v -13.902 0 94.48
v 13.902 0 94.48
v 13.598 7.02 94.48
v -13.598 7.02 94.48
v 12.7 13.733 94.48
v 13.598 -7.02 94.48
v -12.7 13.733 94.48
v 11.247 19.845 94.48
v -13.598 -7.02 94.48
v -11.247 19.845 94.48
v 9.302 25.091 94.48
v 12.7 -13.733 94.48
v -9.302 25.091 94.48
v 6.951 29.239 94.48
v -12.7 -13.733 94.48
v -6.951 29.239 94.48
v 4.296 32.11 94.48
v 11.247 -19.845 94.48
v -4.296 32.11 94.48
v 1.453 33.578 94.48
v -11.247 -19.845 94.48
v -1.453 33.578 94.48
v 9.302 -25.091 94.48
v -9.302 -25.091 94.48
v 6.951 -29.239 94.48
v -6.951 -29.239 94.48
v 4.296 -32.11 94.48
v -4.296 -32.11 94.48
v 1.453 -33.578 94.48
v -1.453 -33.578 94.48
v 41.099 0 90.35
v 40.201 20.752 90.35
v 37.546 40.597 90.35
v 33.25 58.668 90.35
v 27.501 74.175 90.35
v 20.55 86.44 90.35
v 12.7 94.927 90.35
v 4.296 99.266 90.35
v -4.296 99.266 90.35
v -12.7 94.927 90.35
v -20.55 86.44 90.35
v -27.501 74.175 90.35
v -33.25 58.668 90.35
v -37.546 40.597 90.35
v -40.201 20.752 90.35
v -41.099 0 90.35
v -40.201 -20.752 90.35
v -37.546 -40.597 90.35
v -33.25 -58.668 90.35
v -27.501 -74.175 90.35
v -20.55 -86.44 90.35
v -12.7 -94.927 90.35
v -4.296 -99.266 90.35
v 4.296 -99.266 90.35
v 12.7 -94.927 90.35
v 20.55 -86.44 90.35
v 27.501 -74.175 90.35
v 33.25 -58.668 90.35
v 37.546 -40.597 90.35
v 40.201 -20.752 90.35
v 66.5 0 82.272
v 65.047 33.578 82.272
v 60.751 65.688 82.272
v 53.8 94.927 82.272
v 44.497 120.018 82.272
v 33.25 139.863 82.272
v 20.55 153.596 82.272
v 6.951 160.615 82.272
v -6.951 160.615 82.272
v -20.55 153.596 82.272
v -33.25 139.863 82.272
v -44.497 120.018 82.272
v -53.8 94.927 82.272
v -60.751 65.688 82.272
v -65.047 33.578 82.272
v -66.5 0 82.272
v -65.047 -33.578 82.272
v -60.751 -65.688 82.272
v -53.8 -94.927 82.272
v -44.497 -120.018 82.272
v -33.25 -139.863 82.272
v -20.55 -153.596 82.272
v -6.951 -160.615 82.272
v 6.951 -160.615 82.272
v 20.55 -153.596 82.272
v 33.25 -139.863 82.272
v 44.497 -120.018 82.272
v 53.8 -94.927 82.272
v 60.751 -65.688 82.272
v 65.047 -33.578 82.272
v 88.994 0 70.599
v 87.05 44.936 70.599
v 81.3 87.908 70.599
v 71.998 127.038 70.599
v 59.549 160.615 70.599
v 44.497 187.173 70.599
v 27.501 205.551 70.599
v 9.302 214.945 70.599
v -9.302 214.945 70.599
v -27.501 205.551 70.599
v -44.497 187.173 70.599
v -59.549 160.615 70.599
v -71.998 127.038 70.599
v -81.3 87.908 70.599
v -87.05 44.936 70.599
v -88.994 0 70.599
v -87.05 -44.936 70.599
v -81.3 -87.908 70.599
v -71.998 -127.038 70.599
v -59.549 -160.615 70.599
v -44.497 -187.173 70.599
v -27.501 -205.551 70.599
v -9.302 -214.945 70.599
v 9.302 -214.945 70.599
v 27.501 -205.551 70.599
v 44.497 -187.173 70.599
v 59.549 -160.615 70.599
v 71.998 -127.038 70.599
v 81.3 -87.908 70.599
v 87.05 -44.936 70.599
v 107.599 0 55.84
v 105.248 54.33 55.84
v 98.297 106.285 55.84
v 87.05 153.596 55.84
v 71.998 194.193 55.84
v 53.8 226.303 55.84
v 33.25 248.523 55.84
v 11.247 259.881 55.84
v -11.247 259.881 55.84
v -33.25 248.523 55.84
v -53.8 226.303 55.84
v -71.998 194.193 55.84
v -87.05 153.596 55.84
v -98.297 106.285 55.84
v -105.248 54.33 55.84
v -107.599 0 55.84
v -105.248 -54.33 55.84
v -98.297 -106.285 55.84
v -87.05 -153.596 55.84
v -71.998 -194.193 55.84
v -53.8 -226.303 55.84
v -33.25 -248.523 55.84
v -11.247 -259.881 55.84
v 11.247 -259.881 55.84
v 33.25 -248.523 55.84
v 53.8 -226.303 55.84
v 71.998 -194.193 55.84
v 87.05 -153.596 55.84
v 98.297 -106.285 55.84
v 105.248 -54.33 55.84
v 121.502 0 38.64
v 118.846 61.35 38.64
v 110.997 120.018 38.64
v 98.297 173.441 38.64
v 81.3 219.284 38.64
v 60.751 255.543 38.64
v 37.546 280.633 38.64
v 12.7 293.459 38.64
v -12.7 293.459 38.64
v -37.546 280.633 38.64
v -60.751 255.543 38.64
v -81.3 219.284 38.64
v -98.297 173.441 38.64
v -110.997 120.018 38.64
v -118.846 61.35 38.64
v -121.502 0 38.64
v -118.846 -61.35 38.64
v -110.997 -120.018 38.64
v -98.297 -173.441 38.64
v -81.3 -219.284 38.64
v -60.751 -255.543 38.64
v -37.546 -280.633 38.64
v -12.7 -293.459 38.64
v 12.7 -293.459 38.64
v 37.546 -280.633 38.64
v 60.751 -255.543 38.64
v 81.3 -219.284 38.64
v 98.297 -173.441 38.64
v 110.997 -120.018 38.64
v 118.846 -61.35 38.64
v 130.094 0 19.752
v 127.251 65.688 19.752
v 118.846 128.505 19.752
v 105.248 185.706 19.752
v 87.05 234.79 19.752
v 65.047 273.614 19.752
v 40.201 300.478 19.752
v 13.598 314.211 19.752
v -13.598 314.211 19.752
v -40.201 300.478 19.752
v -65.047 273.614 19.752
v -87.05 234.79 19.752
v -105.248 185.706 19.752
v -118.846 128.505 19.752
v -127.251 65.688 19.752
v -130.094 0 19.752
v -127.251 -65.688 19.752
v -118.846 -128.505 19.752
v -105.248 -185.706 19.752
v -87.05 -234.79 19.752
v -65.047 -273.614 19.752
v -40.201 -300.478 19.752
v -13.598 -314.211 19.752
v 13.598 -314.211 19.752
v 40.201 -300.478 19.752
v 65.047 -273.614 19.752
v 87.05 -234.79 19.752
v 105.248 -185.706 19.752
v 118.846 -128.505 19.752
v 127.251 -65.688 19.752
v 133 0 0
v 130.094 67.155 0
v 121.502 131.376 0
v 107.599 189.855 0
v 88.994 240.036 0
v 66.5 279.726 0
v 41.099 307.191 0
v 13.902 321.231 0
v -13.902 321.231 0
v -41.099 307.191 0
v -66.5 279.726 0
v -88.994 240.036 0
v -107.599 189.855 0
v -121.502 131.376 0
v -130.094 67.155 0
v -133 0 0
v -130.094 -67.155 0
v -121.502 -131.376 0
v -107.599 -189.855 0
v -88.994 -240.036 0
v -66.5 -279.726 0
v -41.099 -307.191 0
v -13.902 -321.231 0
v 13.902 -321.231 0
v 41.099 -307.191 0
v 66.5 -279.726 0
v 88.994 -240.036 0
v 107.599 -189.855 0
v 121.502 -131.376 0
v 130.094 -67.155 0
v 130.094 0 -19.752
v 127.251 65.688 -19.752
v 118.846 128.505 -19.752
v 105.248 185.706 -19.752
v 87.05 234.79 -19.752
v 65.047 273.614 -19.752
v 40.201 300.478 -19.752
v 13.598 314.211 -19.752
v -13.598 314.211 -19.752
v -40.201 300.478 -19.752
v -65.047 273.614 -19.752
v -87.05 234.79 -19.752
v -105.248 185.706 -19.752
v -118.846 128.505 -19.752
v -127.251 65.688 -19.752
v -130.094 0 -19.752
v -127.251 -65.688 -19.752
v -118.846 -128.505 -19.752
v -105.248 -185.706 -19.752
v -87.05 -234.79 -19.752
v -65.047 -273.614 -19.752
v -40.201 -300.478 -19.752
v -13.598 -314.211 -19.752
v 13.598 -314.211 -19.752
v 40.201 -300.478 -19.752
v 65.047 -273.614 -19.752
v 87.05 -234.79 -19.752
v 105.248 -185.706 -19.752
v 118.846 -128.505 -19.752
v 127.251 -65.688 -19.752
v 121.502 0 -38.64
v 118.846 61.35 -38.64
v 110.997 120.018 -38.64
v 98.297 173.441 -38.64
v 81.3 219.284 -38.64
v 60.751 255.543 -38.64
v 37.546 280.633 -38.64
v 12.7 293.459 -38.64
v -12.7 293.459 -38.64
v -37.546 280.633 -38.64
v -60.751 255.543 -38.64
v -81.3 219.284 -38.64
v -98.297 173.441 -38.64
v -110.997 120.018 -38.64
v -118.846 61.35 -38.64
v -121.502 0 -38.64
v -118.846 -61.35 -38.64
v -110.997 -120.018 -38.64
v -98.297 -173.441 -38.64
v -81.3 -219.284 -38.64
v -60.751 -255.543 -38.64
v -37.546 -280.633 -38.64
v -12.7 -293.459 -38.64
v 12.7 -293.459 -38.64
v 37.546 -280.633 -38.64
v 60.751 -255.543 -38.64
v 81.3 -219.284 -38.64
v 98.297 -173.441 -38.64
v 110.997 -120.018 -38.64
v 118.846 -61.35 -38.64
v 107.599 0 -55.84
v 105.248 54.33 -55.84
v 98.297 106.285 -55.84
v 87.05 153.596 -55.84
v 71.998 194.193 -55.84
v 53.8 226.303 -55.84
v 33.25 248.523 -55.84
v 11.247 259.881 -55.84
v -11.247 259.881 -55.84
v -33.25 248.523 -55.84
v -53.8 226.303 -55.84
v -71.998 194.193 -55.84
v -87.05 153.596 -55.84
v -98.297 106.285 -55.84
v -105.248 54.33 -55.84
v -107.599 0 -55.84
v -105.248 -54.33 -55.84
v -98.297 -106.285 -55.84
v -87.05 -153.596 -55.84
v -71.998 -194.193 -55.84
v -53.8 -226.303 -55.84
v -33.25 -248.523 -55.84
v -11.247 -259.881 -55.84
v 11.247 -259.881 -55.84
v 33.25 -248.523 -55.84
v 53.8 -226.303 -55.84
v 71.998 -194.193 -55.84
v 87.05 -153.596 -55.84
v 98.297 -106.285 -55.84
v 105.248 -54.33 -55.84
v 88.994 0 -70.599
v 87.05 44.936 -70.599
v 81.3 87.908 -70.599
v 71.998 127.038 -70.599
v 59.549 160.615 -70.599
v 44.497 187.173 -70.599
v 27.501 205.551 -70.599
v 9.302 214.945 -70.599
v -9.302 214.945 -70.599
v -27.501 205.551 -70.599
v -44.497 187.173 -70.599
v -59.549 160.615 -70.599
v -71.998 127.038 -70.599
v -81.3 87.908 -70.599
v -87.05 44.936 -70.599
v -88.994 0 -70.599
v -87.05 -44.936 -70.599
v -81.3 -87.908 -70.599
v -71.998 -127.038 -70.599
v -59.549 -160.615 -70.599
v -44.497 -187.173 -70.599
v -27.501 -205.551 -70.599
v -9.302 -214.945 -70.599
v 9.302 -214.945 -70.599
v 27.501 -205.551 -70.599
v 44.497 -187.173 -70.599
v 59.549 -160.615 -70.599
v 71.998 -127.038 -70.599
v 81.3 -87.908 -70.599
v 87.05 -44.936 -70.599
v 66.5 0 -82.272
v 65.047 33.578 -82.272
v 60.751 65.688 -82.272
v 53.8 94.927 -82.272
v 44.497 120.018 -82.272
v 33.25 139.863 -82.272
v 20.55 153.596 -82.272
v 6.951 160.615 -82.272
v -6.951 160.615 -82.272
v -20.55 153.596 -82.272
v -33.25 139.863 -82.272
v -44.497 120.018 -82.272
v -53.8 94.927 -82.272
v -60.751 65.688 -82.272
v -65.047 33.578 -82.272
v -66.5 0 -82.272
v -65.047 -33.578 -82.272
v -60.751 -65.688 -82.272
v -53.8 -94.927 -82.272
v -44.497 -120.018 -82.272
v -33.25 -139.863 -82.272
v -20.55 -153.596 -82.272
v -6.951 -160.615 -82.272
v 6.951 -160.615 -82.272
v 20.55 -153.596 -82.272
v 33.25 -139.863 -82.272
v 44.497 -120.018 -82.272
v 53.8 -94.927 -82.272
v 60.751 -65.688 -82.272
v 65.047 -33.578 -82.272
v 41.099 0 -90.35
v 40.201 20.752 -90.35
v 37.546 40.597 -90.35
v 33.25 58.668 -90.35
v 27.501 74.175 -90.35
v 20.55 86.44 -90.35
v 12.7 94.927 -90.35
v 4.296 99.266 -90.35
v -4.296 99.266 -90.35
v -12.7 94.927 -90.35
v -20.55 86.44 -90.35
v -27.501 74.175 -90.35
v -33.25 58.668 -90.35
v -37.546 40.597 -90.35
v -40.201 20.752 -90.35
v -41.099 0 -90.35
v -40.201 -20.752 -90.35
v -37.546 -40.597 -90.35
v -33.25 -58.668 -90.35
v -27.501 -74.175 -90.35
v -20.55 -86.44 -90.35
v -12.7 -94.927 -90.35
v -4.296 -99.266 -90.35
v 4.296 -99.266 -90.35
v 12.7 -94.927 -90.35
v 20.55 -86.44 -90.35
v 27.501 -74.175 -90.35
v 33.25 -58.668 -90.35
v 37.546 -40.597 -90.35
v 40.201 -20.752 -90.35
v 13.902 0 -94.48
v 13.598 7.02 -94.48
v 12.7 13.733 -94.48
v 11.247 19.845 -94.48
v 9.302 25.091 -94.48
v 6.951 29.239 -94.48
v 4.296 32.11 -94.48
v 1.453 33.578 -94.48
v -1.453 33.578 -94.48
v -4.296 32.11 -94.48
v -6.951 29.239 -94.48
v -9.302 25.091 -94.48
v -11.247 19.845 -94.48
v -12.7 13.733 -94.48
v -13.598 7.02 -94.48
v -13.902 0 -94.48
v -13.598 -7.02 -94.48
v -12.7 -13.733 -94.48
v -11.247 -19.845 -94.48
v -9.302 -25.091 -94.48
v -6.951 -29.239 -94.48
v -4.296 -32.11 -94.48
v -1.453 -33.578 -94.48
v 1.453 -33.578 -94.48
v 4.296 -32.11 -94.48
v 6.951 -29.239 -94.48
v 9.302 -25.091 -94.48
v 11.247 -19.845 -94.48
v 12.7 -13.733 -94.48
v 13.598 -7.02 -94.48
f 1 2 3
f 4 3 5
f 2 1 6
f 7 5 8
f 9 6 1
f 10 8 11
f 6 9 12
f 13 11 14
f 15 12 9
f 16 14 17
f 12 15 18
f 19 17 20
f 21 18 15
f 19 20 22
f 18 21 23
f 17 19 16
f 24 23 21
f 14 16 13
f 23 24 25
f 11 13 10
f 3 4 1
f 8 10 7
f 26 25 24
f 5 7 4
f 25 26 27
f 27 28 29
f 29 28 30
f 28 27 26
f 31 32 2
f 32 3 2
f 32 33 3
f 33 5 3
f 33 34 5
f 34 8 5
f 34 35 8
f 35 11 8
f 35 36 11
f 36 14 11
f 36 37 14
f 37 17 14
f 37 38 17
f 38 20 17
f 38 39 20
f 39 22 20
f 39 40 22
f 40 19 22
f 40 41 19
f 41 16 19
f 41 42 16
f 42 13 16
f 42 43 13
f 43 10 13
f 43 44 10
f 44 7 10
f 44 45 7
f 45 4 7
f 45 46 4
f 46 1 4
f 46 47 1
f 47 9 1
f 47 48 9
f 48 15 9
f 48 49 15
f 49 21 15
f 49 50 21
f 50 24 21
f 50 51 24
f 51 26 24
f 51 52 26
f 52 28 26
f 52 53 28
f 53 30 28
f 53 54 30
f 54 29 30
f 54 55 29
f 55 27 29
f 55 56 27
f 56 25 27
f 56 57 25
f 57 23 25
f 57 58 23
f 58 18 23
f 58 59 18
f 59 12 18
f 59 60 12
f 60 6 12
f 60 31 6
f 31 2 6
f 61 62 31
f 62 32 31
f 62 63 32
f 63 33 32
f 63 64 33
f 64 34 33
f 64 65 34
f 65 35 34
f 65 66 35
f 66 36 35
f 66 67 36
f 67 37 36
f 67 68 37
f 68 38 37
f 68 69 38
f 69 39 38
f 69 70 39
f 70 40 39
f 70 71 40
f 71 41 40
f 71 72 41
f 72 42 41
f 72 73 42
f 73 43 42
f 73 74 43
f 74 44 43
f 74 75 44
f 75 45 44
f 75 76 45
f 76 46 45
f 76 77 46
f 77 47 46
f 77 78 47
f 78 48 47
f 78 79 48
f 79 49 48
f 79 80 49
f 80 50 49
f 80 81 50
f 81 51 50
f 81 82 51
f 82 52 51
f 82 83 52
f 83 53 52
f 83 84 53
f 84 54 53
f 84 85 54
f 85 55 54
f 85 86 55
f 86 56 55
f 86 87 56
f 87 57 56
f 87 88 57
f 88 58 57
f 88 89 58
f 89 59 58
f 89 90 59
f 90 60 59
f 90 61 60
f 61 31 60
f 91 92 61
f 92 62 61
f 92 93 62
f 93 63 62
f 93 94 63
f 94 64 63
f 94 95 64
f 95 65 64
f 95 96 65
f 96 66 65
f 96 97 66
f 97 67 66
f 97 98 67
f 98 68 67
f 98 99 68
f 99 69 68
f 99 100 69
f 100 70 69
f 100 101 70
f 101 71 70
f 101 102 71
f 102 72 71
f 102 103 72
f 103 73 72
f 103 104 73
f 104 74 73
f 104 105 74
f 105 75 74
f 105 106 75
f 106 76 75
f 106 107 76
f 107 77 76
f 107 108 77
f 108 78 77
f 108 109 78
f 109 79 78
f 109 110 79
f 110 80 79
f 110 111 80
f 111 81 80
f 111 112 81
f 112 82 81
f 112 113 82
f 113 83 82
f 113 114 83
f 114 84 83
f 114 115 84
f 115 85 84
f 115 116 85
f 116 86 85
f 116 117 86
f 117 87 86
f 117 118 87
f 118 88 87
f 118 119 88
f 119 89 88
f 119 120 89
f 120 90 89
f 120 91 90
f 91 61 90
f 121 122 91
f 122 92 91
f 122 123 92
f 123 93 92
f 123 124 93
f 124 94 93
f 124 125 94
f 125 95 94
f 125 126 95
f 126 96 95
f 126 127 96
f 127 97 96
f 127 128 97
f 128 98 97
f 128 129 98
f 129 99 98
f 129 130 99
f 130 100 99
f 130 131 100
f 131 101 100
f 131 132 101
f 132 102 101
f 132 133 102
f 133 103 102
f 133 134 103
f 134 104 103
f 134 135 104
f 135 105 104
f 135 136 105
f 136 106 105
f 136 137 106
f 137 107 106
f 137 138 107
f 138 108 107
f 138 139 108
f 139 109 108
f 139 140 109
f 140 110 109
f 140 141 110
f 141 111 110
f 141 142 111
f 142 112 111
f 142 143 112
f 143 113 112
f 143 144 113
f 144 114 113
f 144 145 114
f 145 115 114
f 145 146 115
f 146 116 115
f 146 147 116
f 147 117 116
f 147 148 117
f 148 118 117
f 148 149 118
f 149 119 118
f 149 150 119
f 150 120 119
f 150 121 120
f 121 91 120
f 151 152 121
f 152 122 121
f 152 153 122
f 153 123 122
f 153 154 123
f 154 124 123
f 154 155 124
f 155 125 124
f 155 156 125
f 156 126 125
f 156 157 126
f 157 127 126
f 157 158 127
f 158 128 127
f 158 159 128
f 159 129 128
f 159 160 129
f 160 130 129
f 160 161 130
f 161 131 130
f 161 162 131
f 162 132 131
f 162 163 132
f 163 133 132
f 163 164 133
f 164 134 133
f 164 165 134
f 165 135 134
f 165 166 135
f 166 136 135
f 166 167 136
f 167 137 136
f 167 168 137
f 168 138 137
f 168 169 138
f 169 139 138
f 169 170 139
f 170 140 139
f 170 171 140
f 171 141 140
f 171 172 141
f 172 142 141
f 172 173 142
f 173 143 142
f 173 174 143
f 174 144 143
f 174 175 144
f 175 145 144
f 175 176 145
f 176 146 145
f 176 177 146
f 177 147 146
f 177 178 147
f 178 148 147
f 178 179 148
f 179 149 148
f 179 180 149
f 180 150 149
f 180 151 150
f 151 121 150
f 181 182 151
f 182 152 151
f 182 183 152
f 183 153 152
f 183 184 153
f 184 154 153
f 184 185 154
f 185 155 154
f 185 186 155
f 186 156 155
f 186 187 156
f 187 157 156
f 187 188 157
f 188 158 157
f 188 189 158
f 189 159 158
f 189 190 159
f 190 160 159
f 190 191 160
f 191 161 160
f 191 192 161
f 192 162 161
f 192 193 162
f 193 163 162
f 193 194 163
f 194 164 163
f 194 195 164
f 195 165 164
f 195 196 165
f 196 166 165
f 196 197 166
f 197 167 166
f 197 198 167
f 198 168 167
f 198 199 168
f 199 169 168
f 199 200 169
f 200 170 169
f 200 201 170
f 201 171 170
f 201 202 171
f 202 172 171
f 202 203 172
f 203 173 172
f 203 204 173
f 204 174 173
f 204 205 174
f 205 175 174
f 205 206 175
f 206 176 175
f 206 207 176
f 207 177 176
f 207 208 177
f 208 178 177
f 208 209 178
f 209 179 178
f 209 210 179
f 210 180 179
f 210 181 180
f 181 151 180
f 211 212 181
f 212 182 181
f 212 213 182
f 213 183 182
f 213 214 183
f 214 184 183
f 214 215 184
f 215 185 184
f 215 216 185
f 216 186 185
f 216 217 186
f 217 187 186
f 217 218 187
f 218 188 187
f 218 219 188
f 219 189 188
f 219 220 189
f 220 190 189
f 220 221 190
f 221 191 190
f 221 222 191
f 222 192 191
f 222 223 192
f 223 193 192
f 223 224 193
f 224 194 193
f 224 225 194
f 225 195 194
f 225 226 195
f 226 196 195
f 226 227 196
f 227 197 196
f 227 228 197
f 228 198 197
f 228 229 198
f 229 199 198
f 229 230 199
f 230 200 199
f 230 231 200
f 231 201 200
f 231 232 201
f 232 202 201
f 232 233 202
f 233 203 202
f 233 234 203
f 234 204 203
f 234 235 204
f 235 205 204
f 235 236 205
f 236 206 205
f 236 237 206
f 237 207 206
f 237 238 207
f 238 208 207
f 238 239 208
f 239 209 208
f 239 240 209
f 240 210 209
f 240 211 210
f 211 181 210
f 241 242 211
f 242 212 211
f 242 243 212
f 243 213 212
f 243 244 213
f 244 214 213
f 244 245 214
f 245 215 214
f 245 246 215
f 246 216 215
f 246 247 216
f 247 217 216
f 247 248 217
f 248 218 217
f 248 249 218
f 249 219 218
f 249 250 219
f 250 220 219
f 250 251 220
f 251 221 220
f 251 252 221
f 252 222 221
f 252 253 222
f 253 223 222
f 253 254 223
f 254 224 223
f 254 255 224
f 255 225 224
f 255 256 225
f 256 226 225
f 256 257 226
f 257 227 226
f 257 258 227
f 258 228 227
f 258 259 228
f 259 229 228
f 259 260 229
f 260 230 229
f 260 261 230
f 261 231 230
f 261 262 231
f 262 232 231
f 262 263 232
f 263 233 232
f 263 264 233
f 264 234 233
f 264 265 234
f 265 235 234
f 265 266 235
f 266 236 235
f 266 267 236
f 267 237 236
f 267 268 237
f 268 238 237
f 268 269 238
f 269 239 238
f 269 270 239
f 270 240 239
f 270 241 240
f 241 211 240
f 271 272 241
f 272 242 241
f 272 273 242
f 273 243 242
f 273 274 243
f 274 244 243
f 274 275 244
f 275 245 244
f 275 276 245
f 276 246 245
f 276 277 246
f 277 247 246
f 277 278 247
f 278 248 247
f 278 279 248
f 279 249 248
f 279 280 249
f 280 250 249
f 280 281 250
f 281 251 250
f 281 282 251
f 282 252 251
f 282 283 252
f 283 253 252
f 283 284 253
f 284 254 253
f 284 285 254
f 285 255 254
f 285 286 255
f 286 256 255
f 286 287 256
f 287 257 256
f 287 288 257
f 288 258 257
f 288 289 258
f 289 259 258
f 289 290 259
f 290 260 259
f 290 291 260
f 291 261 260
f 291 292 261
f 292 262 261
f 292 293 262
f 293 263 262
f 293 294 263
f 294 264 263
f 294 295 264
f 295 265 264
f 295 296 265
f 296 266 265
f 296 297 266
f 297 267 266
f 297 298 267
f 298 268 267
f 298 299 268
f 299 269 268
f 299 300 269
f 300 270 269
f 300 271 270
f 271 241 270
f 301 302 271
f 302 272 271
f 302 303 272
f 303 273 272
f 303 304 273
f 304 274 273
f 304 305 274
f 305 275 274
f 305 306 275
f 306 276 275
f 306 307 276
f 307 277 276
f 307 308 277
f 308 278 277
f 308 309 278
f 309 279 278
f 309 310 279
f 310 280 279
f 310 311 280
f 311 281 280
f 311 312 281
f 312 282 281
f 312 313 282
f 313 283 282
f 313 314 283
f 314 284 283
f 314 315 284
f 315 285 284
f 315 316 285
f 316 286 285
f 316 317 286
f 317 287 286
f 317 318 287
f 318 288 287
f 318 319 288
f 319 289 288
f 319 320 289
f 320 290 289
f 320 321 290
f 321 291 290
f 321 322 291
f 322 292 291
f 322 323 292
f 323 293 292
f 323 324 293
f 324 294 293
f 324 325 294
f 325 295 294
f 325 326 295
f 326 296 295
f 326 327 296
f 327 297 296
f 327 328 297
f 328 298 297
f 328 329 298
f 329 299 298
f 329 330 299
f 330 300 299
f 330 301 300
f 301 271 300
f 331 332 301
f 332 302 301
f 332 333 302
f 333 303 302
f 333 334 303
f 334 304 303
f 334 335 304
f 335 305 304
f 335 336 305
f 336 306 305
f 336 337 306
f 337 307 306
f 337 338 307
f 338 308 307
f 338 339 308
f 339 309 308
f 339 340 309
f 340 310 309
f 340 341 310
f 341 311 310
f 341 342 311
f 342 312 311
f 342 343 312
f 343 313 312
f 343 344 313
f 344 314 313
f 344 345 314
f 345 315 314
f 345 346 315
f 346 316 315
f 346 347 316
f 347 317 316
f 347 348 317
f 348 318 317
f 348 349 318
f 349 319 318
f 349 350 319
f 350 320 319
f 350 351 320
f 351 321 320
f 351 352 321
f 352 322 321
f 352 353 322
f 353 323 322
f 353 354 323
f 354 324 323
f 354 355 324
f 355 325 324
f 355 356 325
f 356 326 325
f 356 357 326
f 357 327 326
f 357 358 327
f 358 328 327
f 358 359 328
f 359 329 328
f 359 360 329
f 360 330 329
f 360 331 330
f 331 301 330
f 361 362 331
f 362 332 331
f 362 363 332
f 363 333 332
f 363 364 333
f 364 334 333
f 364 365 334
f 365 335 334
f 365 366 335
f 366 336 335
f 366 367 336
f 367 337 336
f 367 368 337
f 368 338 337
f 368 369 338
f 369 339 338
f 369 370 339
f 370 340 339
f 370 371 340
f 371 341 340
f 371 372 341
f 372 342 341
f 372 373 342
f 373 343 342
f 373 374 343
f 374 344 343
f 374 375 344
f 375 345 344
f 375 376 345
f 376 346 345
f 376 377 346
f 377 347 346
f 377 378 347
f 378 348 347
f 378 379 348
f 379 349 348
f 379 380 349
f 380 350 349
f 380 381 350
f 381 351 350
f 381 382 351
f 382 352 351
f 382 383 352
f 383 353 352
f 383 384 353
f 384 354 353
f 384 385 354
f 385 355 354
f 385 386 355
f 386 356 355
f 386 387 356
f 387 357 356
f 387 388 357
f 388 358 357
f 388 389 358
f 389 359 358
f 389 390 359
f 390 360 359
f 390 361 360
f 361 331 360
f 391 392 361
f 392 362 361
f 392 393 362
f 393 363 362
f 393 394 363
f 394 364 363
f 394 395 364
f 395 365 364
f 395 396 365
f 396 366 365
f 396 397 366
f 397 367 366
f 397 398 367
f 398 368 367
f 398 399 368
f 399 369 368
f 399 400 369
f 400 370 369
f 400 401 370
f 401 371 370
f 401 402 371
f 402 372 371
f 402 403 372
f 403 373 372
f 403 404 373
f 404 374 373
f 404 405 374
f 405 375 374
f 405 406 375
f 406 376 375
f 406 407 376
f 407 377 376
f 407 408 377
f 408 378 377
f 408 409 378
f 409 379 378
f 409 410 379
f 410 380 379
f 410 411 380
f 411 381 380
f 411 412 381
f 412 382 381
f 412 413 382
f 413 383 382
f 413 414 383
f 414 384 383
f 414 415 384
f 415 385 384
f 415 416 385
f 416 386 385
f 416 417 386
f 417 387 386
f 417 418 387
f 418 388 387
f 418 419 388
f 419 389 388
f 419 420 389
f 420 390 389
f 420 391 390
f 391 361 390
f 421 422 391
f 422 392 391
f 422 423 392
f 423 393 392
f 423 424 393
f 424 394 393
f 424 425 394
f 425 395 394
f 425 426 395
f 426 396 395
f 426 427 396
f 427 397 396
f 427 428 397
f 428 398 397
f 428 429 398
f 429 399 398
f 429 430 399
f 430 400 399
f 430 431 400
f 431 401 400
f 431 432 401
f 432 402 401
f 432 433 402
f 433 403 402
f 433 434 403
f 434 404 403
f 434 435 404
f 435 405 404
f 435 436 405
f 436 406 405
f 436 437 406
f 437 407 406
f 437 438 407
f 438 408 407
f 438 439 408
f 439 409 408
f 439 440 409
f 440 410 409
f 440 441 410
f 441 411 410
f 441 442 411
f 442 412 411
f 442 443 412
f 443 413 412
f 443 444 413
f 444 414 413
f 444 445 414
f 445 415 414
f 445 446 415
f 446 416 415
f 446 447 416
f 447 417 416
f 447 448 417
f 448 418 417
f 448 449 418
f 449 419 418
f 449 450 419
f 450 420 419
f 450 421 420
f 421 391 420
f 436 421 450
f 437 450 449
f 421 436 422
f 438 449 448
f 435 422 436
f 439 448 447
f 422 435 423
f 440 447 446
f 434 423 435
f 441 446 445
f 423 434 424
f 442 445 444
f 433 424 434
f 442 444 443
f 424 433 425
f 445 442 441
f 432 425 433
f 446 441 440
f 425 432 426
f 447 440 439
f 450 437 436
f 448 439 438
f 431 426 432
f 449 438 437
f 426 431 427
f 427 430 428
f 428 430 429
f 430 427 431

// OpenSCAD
// Generated by SolidPython 1.0.1 on 2020-07-29 00:46:48


scale(v = [7, 17, 5]) {
	sphere(r = 19);
}
/***********************************************
*********      SolidPython code:      **********
************************************************
 
# import packages: SolidPython
from solid import *
from solid.utils import *
from itertools import chain, combinations, permutations


class Resize:

    def __init__(self, scad_file):
        self.scad_file = scad_file
        #self.scad_file = import_scad(scad_file)
        # cone/cylinder param:
        self.r1 = 0
        self.r2 = 0
        self.h = 0
        # rectangular prism param:
        self.w = 0
        self.l = 0
        # ellipse param:
        self.r = 0

    # import OpenScad code (file name corresponds to shape)


    # classify shape + parameters
    def assign(self, param1, param2, param3):
        if self.scad_file == 'cone.scad':
            self.r1 = param1
            self.r2 = param2
            self.h = param3
        elif self.scad_file == 'cylinder.scad':
            self.r1 = param1
            self.r2 = param2
            self.h = param3
        elif self.scad_file == 'rectangularPrism.scad':
            self.h = param1
            self.l = param2
            self.w = param3
        else:
            self.r = param1
            self.h = param2

    # resize parameters
    def iterate(self):
        x = range(3, 20, 2)
        i = 1
        if self.scad_file == 'cone.scad':
            tempList = list(permutations(x, 2))
            for temp in tempList:
                param1 = temp[0]
                param2 = temp[1]
                filepath = 'produced_scad_files/' + 'cone' + str(param1) + '_' + str(param2) + '_' + '.scad'
                scad_render_to_file(cylinder(h=param1, r1=param2, r2=0), filepath)

        elif self.scad_file == 'cylinder.scad':
            tempList = list(permutations(x, 3))
            for temp in tempList:
                param1 = temp[0]
                param2 = temp[1]
                filepath = 'produced_scad_files/' + 'cylinder' + str(param1) + '_' + str(param2) + '_' + '.scad'
                scad_render_to_file(cylinder(h=param1, r1=param2, r2=param2), filepath)

        elif self.scad_file == 'rectangularPrism.scad':
            tempList = list(permutations(x, 3))
            for temp in tempList:
                param1 = temp[0]
                param2 = temp[1]
                param3 = temp[2]
                filepath = 'produced_scad_files/' + 'rectangularPrism' + str(param1) + '_' + str(param2) + '_' + str(
                    param3) + '.scad'
                scad_render_to_file(cube(size=(param1, param2, param3)), filepath)

        elif self.scad_file == 'ellipse.scad':
            tempList = list(permutations(x, 4))
            for temp in tempList:
                param1 = temp[0]
                param2 = temp[1]
                param3 = temp[2]
                param4 = temp[3]
                filepath = 'produced_scad_files/' + 'ellipse' + str(param1) + '_' + str(param2) + '_' + str(param3) + '_' + str(param4) + '.scad'
                scad_render_to_file(scale([param1, param2, param3])(sphere(r=param4)), filepath)

    def render_to_scadfile(self):
        scad_render_to_file(scad, 'example.scad') 
 
************************************************/
